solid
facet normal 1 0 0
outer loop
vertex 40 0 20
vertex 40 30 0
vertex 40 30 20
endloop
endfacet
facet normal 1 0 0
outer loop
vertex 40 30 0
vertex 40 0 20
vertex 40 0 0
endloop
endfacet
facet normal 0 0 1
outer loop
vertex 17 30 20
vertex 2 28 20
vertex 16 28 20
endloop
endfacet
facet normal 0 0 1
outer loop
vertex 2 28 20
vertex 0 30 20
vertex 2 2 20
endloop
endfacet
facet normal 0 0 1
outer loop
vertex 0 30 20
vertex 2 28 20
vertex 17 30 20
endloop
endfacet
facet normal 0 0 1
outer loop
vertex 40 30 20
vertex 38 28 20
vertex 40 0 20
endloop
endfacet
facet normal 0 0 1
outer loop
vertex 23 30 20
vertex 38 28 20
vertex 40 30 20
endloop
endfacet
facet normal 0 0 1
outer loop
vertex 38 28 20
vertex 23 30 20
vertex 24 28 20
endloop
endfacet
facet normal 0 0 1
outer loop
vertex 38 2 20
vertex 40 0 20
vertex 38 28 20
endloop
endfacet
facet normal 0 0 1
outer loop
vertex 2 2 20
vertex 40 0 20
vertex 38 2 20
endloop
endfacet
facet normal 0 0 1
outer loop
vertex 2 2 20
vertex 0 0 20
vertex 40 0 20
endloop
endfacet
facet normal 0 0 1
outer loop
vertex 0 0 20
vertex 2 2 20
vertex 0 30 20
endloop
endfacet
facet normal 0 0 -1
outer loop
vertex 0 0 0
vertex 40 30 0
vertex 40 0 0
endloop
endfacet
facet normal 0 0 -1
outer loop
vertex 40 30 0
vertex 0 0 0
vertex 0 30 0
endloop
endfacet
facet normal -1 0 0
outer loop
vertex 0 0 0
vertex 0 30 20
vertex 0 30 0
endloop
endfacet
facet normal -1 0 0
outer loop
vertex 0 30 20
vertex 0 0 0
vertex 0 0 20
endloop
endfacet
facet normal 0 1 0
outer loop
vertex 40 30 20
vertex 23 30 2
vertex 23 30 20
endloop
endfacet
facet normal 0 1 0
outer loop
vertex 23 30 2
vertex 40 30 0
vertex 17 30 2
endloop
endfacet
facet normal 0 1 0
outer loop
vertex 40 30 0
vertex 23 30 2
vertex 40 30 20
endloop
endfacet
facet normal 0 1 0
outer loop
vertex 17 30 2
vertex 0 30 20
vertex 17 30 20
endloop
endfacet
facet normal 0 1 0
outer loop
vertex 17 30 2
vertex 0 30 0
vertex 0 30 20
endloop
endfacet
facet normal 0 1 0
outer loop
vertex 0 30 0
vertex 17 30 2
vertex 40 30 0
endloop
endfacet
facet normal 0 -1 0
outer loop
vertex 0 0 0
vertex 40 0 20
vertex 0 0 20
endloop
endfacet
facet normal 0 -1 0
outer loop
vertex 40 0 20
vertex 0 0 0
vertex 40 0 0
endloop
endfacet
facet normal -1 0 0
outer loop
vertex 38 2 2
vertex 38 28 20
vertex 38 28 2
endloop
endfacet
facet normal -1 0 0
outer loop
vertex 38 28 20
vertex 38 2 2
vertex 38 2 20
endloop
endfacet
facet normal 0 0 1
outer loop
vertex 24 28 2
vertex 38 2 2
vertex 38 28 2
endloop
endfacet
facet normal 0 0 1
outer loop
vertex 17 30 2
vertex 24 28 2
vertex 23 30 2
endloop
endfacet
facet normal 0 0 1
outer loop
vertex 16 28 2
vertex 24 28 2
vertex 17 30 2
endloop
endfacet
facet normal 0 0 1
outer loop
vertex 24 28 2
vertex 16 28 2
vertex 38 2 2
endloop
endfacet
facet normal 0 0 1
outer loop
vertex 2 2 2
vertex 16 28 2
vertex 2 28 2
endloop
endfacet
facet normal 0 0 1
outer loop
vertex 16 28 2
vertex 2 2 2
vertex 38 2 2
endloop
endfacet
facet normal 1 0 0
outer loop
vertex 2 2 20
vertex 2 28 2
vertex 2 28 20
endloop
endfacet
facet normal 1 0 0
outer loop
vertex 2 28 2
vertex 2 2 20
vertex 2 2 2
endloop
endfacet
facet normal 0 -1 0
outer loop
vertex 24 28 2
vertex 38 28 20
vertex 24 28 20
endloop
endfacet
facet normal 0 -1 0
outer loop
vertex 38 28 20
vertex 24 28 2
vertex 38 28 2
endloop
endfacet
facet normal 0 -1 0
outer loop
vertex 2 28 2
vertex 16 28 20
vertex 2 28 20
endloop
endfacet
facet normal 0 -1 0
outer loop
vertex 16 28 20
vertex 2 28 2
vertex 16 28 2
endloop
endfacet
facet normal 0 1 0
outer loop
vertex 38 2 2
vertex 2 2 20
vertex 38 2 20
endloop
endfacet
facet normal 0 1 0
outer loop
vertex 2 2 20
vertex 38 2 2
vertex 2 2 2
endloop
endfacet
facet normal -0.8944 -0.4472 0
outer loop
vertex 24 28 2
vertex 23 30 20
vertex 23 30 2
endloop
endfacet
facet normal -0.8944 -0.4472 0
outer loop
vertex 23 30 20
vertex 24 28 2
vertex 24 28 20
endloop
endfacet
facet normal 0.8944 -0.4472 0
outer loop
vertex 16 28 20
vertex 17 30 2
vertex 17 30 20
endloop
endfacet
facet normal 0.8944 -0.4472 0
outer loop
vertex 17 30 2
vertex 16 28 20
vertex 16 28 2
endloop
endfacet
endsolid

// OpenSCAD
// dovetail-bin — a small parametric open-top tray with a dovetail mounting key.
//
// Used by Demiourgos's docs and integration tests. The outer envelope is a clean
// `width × depth × height` box so its bounding box is easy to assert; the
// dovetail key is carved as a slot so it does not change the outer dimensions.

// --- Parameters --------------------------------------------------------------
width  = 40;   // X
depth  = 30;   // Y
height = 20;   // Z
wall   = 2;    // wall / floor thickness

dovetail_width  = 10;  // wide edge of the dovetail slot
dovetail_throat = 6;   // narrow edge of the dovetail slot
dovetail_depth  = 4;   // how deep the slot cuts into the back wall

// --- Helpers -----------------------------------------------------------------
module dovetail_slot() {
    // A trapezoidal prism (the classic dovetail cross-section), oriented to cut
    // into the +Y back wall and extruded vertically.
    translate([0, 0, wall])
        linear_extrude(height = height)
            polygon(points = [
                [-dovetail_width / 2,  0],
                [ dovetail_width / 2,  0],
                [ dovetail_throat / 2, dovetail_depth],
                [-dovetail_throat / 2, dovetail_depth],
            ]);
}

// --- Model -------------------------------------------------------------------
module dovetail_bin() {
    difference() {
        // Outer solid.
        cube([width, depth, height]);

        // Open-top cavity.
        translate([wall, wall, wall])
            cube([width - 2 * wall, depth - 2 * wall, height]);

        // Dovetail slot cut into the back wall (at y = depth).
        translate([width / 2, depth - dovetail_depth, 0])
            dovetail_slot();
    }
}

dovetail_bin();
